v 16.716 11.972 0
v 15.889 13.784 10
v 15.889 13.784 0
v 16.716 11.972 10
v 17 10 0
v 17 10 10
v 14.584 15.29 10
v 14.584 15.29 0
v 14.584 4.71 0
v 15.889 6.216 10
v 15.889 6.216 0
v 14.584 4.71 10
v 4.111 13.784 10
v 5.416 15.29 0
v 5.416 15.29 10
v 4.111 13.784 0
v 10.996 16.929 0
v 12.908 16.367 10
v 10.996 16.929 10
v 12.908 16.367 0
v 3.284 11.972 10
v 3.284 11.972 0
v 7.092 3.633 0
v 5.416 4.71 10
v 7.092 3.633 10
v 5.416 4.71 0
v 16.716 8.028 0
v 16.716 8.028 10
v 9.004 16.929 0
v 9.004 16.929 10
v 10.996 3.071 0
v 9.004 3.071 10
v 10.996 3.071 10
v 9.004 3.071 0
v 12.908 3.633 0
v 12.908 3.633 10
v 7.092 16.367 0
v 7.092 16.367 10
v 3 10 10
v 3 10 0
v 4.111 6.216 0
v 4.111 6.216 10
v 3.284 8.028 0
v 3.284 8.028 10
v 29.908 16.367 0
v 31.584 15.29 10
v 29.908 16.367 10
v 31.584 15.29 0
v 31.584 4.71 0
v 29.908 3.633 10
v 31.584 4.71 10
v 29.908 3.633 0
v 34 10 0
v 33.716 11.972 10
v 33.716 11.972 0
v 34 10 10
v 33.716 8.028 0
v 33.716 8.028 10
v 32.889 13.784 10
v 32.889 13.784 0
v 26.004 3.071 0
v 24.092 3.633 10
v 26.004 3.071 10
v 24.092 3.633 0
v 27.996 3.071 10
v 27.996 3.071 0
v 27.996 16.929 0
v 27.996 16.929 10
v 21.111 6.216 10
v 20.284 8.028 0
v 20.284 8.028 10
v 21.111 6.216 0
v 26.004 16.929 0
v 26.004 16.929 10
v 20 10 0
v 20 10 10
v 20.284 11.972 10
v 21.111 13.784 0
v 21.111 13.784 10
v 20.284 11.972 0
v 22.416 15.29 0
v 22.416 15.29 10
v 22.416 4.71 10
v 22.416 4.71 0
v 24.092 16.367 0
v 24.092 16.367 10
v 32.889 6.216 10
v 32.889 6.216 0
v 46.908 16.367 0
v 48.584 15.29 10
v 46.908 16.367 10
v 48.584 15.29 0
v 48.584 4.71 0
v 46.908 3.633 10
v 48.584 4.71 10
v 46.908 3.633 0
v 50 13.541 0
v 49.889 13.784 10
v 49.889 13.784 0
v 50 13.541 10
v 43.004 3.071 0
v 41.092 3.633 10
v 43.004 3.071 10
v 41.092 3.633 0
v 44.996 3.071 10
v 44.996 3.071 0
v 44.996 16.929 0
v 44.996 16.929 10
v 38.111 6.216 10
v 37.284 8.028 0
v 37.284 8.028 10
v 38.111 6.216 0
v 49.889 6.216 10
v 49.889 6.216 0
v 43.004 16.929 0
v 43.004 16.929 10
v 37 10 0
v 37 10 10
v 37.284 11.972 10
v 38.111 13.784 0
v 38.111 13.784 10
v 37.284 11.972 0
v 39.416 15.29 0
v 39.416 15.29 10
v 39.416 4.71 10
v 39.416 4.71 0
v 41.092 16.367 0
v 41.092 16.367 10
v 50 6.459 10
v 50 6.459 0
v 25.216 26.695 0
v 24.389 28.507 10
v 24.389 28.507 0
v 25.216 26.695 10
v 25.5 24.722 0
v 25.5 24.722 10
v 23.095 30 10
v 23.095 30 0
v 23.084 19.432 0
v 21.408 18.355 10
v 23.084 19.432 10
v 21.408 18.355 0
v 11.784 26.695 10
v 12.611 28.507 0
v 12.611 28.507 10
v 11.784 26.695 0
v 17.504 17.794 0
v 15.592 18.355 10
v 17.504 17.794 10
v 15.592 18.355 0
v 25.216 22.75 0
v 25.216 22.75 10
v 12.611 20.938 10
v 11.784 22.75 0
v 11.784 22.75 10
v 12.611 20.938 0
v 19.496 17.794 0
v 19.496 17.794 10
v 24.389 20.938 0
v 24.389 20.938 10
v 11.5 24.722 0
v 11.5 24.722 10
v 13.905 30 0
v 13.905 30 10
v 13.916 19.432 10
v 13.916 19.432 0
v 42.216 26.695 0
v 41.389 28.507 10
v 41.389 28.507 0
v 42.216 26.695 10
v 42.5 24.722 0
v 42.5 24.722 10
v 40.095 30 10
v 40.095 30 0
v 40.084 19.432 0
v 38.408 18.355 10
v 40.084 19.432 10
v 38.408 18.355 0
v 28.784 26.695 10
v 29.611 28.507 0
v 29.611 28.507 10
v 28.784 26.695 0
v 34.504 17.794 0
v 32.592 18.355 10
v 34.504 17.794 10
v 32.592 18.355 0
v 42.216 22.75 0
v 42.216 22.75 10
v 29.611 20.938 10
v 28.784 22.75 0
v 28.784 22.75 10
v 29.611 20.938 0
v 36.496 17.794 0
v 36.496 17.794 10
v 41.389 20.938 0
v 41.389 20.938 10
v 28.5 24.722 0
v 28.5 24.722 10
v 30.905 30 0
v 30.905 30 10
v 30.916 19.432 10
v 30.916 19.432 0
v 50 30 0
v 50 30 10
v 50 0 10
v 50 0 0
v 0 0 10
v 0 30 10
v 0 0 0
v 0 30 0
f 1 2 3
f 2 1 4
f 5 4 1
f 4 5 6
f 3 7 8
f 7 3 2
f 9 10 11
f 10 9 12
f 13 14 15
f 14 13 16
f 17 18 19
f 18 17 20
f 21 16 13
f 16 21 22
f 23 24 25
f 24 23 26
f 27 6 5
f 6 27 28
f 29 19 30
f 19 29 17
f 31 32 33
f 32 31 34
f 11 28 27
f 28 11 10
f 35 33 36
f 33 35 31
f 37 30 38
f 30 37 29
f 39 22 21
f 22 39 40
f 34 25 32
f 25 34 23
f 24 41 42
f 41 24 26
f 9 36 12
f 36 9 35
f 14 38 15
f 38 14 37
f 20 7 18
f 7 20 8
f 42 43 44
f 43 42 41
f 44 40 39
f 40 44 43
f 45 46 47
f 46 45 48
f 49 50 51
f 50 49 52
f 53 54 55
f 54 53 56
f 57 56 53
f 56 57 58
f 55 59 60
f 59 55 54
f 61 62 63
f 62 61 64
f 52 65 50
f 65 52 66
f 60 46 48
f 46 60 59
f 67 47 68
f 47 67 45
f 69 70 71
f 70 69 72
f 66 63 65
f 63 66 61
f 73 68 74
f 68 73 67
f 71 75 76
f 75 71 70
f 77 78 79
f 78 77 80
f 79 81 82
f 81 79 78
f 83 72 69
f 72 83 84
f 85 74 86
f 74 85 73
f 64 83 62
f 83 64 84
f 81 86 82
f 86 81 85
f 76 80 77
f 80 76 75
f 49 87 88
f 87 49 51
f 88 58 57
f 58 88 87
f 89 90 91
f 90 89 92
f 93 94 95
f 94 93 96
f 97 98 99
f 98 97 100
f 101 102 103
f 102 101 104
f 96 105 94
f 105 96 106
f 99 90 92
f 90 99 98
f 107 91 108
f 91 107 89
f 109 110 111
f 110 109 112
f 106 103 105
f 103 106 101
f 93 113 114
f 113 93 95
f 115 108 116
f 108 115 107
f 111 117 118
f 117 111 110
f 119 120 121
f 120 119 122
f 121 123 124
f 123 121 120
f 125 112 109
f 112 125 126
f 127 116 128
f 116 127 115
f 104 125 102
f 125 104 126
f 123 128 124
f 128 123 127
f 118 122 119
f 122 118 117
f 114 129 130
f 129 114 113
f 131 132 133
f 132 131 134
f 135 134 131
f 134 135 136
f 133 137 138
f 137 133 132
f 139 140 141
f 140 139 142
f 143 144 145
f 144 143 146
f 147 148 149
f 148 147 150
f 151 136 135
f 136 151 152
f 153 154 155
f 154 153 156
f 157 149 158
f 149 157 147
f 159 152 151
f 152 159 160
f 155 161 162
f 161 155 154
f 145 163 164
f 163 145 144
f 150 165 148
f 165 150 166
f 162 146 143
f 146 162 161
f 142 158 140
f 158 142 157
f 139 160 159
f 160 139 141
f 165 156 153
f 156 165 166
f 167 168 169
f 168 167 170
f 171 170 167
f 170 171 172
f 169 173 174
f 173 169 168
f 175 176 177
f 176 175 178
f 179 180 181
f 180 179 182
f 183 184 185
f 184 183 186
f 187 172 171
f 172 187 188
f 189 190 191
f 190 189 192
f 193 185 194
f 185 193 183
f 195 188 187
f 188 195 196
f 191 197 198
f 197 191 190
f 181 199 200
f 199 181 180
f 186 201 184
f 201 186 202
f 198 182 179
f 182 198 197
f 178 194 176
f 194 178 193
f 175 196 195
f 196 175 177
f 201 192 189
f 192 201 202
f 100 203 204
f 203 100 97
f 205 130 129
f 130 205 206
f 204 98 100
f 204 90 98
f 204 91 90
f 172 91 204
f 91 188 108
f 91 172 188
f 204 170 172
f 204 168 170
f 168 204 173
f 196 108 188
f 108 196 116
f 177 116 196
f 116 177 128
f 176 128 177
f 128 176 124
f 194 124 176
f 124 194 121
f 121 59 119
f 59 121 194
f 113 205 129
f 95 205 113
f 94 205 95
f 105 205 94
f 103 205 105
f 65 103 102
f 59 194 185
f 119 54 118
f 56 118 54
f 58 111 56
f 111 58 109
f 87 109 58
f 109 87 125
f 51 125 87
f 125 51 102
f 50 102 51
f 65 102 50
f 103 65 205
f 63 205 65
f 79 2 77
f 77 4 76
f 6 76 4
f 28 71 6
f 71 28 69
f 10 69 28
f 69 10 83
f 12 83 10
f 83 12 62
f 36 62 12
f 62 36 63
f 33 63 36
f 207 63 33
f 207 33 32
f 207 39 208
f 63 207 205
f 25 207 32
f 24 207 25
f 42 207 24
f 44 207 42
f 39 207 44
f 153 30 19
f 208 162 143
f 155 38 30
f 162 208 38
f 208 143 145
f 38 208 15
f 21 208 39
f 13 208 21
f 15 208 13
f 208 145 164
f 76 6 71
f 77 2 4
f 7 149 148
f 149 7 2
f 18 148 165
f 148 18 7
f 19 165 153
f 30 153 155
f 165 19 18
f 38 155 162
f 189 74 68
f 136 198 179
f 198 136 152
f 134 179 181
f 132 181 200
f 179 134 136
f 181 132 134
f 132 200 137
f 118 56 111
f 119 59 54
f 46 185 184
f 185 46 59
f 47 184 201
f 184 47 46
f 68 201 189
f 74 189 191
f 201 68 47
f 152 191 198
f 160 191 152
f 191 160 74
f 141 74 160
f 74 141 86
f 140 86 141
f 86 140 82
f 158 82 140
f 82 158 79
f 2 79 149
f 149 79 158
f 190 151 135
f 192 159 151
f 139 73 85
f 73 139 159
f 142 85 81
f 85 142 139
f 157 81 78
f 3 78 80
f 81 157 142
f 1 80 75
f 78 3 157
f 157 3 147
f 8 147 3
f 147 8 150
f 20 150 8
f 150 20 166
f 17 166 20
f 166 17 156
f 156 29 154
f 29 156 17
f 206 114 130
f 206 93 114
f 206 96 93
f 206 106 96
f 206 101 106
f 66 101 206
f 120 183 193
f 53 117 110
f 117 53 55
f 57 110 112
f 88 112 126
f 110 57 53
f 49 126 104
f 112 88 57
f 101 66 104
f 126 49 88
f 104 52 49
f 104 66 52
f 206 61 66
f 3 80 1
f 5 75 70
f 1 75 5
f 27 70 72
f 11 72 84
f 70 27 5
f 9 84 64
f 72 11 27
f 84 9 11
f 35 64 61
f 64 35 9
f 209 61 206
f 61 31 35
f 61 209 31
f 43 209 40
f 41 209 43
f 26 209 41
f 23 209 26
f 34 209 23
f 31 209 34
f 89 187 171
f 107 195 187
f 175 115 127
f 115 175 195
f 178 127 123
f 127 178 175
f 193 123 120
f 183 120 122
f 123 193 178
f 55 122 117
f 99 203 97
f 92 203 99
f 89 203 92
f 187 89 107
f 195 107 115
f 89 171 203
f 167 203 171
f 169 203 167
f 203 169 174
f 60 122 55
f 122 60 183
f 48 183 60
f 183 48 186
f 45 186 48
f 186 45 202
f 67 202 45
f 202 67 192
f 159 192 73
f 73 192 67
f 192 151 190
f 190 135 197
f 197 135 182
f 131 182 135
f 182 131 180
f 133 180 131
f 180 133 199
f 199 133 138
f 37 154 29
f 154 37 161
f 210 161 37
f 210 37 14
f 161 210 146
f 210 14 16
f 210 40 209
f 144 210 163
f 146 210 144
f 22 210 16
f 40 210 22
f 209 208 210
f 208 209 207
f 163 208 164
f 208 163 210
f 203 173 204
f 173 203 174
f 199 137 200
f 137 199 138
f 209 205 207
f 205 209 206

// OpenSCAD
// SOURCE
// http://saccade.com/blog/2019/06/how-to-make-apples-mac-pro-holes/

thickness = 10;

length = 50;
width = 30;

multiple_of_circle = false;

circle_thick_ratio = 0.7;

circle_distance = 3;

// Calculate

circle_rad = thickness * circle_thick_ratio;

startxy = circle_distance + circle_rad;
stepx = 2 * circle_rad + circle_distance;
stepy = stepx * cos(30);
insetx = stepx / 2;

// Generate
difference() {
  cube([length, width, thickness]);

  for (y = [startxy:stepy*2:width]) {
    for (x = [startxy:stepx:length]) {
      translate([x, y, -1])
      cylinder(h = thickness + 2, r = circle_rad);
    }
  }

  for (y = [startxy+stepy:stepy*2:width]) {
    for (x = [startxy+insetx:stepx:length]) {
      translate([x, y, -1])
      cylinder(h = thickness + 2, r = circle_rad);
    }
  }
}
